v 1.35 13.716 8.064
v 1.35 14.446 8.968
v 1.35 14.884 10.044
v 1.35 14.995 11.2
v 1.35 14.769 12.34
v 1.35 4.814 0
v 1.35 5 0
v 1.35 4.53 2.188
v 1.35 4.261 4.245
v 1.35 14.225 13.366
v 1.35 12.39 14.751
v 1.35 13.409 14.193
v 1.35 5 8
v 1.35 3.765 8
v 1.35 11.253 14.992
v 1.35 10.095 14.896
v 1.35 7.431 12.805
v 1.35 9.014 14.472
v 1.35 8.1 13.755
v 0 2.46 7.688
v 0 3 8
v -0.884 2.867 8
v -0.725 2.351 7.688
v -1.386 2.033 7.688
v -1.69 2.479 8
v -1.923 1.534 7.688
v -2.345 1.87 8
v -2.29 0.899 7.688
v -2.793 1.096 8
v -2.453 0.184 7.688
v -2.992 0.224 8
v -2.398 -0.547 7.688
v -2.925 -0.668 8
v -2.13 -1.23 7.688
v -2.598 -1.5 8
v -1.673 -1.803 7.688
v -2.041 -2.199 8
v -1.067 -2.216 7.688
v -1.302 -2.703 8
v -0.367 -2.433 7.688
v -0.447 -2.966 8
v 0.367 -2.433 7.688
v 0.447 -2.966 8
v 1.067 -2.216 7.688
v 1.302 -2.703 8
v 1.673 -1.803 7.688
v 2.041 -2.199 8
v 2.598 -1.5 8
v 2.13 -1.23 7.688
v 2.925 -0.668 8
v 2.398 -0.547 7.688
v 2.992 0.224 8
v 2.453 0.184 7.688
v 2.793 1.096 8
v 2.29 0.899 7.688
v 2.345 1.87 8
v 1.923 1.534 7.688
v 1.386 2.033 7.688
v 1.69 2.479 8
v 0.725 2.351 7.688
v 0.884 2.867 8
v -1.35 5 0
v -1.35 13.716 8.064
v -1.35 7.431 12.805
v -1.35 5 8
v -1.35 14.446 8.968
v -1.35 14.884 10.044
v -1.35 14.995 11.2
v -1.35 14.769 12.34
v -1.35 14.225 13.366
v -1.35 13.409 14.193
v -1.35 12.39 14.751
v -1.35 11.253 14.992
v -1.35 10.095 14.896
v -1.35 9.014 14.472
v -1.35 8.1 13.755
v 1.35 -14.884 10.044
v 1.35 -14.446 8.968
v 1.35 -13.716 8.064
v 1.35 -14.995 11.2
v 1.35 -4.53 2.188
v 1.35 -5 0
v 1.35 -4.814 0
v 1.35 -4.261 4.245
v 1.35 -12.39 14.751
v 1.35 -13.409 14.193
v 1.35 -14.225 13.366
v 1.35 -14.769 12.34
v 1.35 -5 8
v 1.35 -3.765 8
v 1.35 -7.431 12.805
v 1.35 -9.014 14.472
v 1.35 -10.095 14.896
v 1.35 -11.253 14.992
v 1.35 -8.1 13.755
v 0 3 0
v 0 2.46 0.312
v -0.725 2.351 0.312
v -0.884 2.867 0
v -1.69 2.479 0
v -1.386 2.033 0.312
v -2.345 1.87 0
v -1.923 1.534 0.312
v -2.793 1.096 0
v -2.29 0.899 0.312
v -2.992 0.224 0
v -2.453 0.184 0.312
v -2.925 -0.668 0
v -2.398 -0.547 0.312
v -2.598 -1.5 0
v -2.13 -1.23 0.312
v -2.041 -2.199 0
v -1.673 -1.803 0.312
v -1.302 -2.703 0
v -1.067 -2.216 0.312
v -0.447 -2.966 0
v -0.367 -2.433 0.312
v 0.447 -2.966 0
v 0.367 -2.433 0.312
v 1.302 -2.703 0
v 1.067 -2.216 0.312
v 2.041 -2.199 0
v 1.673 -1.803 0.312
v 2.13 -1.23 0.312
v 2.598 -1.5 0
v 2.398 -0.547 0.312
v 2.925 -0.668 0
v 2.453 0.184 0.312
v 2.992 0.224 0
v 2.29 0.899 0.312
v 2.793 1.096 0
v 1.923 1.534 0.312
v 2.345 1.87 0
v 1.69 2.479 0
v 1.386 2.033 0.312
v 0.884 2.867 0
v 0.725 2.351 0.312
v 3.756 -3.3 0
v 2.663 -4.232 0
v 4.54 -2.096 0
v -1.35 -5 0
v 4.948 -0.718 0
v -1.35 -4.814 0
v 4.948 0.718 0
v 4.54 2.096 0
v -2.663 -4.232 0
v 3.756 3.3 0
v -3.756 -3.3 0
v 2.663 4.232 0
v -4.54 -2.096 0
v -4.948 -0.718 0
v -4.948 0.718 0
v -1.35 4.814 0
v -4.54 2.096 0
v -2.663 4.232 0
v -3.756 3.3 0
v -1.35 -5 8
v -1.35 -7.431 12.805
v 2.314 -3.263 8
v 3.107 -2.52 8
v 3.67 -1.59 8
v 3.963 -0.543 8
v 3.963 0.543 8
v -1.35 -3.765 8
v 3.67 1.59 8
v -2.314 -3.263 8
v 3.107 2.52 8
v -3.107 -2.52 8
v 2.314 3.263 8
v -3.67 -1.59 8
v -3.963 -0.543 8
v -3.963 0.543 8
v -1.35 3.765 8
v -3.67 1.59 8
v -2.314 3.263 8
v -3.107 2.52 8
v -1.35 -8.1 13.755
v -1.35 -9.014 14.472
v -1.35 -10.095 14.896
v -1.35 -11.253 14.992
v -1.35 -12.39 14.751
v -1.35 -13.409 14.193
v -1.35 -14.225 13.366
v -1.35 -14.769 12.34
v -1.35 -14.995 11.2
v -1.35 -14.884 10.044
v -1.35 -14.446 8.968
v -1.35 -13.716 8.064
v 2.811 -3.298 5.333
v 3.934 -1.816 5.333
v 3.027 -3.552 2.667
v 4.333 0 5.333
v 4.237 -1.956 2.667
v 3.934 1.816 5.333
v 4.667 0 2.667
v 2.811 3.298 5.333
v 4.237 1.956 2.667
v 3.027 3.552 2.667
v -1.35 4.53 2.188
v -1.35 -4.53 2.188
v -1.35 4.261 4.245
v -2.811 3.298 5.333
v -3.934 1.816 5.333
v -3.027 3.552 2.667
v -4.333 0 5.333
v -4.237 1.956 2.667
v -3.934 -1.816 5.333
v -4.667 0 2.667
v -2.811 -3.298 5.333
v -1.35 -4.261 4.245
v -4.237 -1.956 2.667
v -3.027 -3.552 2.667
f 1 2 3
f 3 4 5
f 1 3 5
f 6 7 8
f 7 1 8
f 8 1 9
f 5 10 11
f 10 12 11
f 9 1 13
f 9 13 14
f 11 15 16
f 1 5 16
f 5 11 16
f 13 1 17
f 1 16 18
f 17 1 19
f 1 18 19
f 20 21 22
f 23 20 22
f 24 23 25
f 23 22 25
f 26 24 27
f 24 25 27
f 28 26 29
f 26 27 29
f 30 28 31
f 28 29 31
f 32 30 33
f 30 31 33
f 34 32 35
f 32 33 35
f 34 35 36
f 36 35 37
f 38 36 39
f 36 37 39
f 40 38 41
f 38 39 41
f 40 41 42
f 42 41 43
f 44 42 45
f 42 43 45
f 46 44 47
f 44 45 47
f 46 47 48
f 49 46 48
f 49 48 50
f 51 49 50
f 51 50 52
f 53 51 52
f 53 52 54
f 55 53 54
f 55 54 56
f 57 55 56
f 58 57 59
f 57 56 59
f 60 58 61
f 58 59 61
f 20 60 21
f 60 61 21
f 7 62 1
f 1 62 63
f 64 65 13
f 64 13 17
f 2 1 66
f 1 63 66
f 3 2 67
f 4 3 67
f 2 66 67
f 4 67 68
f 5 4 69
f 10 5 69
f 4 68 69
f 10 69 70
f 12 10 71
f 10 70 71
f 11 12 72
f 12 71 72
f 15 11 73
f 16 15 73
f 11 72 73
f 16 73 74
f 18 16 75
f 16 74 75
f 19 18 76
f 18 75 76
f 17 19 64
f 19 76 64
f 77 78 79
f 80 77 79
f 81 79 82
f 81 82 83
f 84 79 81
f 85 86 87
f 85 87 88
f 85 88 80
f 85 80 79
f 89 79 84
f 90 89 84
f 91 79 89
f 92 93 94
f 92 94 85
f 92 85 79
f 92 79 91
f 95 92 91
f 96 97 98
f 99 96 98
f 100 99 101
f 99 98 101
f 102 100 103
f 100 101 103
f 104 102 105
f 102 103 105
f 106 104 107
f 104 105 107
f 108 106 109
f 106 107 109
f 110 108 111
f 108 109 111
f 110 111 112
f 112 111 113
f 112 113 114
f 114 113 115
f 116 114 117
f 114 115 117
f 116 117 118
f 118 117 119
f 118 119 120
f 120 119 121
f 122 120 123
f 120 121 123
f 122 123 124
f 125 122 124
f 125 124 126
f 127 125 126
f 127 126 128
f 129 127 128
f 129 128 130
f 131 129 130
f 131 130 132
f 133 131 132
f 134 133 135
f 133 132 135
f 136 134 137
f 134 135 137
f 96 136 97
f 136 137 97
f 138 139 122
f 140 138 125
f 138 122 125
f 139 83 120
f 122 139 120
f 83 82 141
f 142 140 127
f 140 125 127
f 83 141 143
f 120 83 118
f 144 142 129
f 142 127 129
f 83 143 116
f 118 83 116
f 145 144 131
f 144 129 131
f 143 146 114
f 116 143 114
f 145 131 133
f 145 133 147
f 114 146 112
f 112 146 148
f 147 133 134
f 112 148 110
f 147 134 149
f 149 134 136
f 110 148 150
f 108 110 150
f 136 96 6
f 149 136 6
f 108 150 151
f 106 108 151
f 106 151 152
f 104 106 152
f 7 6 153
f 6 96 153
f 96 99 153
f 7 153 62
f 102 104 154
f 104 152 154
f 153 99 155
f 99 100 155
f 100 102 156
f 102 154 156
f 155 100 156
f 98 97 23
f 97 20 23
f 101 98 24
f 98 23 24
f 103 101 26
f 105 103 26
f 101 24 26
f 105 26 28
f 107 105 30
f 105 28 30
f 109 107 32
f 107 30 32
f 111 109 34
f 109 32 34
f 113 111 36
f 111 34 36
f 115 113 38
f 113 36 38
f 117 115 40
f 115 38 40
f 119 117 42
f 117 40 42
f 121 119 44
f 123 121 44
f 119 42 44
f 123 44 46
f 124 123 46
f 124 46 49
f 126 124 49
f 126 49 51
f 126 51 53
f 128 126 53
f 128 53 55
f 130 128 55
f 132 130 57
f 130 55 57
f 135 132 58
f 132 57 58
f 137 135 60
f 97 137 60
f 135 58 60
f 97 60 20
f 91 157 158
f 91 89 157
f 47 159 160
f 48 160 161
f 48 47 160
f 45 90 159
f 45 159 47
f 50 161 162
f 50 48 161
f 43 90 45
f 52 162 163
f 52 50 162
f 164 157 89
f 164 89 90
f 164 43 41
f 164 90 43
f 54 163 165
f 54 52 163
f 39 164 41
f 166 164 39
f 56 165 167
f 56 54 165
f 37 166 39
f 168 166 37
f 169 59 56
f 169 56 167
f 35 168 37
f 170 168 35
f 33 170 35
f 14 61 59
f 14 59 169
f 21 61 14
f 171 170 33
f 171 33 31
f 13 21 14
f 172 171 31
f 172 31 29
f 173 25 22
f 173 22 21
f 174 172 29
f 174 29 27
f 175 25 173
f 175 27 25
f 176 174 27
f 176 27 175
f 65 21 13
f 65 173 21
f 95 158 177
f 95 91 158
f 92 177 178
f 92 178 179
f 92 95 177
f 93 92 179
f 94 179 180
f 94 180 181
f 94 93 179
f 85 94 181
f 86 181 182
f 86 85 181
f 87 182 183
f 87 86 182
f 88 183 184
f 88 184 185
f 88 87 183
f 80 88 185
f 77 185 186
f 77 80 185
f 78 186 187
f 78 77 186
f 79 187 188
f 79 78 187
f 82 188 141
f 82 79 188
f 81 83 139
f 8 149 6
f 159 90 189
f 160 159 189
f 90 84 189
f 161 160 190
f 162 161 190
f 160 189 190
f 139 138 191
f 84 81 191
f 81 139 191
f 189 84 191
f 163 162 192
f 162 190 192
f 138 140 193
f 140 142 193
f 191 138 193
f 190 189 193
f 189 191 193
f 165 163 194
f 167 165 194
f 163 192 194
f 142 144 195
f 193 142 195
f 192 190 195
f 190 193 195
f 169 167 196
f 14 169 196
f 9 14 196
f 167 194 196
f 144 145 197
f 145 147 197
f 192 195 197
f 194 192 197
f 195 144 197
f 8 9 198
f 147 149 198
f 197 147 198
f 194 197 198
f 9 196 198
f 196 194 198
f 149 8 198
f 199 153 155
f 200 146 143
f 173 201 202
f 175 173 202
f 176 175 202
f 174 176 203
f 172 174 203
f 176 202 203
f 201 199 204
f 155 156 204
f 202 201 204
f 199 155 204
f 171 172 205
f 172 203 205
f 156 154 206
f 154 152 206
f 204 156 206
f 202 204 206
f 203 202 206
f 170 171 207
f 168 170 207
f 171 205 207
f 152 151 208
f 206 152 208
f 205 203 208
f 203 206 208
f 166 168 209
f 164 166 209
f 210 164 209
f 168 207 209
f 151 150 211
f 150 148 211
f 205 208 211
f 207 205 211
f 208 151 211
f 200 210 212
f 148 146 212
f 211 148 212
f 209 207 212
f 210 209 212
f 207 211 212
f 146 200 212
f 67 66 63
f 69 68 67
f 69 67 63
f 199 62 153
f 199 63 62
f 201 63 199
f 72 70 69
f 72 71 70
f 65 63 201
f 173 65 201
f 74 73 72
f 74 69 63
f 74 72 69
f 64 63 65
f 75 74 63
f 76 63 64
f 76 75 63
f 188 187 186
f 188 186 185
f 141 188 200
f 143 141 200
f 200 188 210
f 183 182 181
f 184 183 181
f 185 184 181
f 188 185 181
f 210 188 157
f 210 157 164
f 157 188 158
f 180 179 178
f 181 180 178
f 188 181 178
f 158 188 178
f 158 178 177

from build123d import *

# Parameters (mm, degrees)
PAD_DEPTH = 1.35


with BuildPart() as pad:
    # Sketch001 → Pad (new body, symmetric)
    with BuildSketch(Plane.YZ):
        with BuildLine():
            Line((3, 0), (3, 8))
            Line((3, 8), (5, 8))
            Line((5, 8), (7.430632, 12.805439))
            ThreePointArc((13.716382, 8.063801), (13.408875, 14.193324), (7.430632, 12.805439))
            Line((5, 0), (13.716382, 8.063801))
            Line((3, 0), (5, 0))
        make_face()
        with BuildLine():
            Line((-13.716382, 8.063801), (-5, 0))
            Line((-5, 0), (-3, 0))
            Line((-3, 0), (-3, 8))
            Line((-3, 8), (-5, 8))
            Line((-5, 8), (-7.430632, 12.805439))
            ThreePointArc((-7.430632, 12.805439), (-13.408875, 14.193324), (-13.716382, 8.063801))
        make_face()
    extrude(amount=PAD_DEPTH, both=True)


with BuildPart() as fl_gelmutter_din_315_m6:
    # Sketch → Revolution (revolve)
    with BuildSketch(Plane.YZ):
        Polygon((3, 0), (2.46, 0.311769), (2.46, 7.688231), (3, 8), (4, 8), (5, 0), align=None)
    revolve(axis=Axis((0, 0, 0), (0, 0, 1)))

    # Fusion: union Pad
    add(pad.part)


solid = fl_gelmutter_din_315_m6.part
